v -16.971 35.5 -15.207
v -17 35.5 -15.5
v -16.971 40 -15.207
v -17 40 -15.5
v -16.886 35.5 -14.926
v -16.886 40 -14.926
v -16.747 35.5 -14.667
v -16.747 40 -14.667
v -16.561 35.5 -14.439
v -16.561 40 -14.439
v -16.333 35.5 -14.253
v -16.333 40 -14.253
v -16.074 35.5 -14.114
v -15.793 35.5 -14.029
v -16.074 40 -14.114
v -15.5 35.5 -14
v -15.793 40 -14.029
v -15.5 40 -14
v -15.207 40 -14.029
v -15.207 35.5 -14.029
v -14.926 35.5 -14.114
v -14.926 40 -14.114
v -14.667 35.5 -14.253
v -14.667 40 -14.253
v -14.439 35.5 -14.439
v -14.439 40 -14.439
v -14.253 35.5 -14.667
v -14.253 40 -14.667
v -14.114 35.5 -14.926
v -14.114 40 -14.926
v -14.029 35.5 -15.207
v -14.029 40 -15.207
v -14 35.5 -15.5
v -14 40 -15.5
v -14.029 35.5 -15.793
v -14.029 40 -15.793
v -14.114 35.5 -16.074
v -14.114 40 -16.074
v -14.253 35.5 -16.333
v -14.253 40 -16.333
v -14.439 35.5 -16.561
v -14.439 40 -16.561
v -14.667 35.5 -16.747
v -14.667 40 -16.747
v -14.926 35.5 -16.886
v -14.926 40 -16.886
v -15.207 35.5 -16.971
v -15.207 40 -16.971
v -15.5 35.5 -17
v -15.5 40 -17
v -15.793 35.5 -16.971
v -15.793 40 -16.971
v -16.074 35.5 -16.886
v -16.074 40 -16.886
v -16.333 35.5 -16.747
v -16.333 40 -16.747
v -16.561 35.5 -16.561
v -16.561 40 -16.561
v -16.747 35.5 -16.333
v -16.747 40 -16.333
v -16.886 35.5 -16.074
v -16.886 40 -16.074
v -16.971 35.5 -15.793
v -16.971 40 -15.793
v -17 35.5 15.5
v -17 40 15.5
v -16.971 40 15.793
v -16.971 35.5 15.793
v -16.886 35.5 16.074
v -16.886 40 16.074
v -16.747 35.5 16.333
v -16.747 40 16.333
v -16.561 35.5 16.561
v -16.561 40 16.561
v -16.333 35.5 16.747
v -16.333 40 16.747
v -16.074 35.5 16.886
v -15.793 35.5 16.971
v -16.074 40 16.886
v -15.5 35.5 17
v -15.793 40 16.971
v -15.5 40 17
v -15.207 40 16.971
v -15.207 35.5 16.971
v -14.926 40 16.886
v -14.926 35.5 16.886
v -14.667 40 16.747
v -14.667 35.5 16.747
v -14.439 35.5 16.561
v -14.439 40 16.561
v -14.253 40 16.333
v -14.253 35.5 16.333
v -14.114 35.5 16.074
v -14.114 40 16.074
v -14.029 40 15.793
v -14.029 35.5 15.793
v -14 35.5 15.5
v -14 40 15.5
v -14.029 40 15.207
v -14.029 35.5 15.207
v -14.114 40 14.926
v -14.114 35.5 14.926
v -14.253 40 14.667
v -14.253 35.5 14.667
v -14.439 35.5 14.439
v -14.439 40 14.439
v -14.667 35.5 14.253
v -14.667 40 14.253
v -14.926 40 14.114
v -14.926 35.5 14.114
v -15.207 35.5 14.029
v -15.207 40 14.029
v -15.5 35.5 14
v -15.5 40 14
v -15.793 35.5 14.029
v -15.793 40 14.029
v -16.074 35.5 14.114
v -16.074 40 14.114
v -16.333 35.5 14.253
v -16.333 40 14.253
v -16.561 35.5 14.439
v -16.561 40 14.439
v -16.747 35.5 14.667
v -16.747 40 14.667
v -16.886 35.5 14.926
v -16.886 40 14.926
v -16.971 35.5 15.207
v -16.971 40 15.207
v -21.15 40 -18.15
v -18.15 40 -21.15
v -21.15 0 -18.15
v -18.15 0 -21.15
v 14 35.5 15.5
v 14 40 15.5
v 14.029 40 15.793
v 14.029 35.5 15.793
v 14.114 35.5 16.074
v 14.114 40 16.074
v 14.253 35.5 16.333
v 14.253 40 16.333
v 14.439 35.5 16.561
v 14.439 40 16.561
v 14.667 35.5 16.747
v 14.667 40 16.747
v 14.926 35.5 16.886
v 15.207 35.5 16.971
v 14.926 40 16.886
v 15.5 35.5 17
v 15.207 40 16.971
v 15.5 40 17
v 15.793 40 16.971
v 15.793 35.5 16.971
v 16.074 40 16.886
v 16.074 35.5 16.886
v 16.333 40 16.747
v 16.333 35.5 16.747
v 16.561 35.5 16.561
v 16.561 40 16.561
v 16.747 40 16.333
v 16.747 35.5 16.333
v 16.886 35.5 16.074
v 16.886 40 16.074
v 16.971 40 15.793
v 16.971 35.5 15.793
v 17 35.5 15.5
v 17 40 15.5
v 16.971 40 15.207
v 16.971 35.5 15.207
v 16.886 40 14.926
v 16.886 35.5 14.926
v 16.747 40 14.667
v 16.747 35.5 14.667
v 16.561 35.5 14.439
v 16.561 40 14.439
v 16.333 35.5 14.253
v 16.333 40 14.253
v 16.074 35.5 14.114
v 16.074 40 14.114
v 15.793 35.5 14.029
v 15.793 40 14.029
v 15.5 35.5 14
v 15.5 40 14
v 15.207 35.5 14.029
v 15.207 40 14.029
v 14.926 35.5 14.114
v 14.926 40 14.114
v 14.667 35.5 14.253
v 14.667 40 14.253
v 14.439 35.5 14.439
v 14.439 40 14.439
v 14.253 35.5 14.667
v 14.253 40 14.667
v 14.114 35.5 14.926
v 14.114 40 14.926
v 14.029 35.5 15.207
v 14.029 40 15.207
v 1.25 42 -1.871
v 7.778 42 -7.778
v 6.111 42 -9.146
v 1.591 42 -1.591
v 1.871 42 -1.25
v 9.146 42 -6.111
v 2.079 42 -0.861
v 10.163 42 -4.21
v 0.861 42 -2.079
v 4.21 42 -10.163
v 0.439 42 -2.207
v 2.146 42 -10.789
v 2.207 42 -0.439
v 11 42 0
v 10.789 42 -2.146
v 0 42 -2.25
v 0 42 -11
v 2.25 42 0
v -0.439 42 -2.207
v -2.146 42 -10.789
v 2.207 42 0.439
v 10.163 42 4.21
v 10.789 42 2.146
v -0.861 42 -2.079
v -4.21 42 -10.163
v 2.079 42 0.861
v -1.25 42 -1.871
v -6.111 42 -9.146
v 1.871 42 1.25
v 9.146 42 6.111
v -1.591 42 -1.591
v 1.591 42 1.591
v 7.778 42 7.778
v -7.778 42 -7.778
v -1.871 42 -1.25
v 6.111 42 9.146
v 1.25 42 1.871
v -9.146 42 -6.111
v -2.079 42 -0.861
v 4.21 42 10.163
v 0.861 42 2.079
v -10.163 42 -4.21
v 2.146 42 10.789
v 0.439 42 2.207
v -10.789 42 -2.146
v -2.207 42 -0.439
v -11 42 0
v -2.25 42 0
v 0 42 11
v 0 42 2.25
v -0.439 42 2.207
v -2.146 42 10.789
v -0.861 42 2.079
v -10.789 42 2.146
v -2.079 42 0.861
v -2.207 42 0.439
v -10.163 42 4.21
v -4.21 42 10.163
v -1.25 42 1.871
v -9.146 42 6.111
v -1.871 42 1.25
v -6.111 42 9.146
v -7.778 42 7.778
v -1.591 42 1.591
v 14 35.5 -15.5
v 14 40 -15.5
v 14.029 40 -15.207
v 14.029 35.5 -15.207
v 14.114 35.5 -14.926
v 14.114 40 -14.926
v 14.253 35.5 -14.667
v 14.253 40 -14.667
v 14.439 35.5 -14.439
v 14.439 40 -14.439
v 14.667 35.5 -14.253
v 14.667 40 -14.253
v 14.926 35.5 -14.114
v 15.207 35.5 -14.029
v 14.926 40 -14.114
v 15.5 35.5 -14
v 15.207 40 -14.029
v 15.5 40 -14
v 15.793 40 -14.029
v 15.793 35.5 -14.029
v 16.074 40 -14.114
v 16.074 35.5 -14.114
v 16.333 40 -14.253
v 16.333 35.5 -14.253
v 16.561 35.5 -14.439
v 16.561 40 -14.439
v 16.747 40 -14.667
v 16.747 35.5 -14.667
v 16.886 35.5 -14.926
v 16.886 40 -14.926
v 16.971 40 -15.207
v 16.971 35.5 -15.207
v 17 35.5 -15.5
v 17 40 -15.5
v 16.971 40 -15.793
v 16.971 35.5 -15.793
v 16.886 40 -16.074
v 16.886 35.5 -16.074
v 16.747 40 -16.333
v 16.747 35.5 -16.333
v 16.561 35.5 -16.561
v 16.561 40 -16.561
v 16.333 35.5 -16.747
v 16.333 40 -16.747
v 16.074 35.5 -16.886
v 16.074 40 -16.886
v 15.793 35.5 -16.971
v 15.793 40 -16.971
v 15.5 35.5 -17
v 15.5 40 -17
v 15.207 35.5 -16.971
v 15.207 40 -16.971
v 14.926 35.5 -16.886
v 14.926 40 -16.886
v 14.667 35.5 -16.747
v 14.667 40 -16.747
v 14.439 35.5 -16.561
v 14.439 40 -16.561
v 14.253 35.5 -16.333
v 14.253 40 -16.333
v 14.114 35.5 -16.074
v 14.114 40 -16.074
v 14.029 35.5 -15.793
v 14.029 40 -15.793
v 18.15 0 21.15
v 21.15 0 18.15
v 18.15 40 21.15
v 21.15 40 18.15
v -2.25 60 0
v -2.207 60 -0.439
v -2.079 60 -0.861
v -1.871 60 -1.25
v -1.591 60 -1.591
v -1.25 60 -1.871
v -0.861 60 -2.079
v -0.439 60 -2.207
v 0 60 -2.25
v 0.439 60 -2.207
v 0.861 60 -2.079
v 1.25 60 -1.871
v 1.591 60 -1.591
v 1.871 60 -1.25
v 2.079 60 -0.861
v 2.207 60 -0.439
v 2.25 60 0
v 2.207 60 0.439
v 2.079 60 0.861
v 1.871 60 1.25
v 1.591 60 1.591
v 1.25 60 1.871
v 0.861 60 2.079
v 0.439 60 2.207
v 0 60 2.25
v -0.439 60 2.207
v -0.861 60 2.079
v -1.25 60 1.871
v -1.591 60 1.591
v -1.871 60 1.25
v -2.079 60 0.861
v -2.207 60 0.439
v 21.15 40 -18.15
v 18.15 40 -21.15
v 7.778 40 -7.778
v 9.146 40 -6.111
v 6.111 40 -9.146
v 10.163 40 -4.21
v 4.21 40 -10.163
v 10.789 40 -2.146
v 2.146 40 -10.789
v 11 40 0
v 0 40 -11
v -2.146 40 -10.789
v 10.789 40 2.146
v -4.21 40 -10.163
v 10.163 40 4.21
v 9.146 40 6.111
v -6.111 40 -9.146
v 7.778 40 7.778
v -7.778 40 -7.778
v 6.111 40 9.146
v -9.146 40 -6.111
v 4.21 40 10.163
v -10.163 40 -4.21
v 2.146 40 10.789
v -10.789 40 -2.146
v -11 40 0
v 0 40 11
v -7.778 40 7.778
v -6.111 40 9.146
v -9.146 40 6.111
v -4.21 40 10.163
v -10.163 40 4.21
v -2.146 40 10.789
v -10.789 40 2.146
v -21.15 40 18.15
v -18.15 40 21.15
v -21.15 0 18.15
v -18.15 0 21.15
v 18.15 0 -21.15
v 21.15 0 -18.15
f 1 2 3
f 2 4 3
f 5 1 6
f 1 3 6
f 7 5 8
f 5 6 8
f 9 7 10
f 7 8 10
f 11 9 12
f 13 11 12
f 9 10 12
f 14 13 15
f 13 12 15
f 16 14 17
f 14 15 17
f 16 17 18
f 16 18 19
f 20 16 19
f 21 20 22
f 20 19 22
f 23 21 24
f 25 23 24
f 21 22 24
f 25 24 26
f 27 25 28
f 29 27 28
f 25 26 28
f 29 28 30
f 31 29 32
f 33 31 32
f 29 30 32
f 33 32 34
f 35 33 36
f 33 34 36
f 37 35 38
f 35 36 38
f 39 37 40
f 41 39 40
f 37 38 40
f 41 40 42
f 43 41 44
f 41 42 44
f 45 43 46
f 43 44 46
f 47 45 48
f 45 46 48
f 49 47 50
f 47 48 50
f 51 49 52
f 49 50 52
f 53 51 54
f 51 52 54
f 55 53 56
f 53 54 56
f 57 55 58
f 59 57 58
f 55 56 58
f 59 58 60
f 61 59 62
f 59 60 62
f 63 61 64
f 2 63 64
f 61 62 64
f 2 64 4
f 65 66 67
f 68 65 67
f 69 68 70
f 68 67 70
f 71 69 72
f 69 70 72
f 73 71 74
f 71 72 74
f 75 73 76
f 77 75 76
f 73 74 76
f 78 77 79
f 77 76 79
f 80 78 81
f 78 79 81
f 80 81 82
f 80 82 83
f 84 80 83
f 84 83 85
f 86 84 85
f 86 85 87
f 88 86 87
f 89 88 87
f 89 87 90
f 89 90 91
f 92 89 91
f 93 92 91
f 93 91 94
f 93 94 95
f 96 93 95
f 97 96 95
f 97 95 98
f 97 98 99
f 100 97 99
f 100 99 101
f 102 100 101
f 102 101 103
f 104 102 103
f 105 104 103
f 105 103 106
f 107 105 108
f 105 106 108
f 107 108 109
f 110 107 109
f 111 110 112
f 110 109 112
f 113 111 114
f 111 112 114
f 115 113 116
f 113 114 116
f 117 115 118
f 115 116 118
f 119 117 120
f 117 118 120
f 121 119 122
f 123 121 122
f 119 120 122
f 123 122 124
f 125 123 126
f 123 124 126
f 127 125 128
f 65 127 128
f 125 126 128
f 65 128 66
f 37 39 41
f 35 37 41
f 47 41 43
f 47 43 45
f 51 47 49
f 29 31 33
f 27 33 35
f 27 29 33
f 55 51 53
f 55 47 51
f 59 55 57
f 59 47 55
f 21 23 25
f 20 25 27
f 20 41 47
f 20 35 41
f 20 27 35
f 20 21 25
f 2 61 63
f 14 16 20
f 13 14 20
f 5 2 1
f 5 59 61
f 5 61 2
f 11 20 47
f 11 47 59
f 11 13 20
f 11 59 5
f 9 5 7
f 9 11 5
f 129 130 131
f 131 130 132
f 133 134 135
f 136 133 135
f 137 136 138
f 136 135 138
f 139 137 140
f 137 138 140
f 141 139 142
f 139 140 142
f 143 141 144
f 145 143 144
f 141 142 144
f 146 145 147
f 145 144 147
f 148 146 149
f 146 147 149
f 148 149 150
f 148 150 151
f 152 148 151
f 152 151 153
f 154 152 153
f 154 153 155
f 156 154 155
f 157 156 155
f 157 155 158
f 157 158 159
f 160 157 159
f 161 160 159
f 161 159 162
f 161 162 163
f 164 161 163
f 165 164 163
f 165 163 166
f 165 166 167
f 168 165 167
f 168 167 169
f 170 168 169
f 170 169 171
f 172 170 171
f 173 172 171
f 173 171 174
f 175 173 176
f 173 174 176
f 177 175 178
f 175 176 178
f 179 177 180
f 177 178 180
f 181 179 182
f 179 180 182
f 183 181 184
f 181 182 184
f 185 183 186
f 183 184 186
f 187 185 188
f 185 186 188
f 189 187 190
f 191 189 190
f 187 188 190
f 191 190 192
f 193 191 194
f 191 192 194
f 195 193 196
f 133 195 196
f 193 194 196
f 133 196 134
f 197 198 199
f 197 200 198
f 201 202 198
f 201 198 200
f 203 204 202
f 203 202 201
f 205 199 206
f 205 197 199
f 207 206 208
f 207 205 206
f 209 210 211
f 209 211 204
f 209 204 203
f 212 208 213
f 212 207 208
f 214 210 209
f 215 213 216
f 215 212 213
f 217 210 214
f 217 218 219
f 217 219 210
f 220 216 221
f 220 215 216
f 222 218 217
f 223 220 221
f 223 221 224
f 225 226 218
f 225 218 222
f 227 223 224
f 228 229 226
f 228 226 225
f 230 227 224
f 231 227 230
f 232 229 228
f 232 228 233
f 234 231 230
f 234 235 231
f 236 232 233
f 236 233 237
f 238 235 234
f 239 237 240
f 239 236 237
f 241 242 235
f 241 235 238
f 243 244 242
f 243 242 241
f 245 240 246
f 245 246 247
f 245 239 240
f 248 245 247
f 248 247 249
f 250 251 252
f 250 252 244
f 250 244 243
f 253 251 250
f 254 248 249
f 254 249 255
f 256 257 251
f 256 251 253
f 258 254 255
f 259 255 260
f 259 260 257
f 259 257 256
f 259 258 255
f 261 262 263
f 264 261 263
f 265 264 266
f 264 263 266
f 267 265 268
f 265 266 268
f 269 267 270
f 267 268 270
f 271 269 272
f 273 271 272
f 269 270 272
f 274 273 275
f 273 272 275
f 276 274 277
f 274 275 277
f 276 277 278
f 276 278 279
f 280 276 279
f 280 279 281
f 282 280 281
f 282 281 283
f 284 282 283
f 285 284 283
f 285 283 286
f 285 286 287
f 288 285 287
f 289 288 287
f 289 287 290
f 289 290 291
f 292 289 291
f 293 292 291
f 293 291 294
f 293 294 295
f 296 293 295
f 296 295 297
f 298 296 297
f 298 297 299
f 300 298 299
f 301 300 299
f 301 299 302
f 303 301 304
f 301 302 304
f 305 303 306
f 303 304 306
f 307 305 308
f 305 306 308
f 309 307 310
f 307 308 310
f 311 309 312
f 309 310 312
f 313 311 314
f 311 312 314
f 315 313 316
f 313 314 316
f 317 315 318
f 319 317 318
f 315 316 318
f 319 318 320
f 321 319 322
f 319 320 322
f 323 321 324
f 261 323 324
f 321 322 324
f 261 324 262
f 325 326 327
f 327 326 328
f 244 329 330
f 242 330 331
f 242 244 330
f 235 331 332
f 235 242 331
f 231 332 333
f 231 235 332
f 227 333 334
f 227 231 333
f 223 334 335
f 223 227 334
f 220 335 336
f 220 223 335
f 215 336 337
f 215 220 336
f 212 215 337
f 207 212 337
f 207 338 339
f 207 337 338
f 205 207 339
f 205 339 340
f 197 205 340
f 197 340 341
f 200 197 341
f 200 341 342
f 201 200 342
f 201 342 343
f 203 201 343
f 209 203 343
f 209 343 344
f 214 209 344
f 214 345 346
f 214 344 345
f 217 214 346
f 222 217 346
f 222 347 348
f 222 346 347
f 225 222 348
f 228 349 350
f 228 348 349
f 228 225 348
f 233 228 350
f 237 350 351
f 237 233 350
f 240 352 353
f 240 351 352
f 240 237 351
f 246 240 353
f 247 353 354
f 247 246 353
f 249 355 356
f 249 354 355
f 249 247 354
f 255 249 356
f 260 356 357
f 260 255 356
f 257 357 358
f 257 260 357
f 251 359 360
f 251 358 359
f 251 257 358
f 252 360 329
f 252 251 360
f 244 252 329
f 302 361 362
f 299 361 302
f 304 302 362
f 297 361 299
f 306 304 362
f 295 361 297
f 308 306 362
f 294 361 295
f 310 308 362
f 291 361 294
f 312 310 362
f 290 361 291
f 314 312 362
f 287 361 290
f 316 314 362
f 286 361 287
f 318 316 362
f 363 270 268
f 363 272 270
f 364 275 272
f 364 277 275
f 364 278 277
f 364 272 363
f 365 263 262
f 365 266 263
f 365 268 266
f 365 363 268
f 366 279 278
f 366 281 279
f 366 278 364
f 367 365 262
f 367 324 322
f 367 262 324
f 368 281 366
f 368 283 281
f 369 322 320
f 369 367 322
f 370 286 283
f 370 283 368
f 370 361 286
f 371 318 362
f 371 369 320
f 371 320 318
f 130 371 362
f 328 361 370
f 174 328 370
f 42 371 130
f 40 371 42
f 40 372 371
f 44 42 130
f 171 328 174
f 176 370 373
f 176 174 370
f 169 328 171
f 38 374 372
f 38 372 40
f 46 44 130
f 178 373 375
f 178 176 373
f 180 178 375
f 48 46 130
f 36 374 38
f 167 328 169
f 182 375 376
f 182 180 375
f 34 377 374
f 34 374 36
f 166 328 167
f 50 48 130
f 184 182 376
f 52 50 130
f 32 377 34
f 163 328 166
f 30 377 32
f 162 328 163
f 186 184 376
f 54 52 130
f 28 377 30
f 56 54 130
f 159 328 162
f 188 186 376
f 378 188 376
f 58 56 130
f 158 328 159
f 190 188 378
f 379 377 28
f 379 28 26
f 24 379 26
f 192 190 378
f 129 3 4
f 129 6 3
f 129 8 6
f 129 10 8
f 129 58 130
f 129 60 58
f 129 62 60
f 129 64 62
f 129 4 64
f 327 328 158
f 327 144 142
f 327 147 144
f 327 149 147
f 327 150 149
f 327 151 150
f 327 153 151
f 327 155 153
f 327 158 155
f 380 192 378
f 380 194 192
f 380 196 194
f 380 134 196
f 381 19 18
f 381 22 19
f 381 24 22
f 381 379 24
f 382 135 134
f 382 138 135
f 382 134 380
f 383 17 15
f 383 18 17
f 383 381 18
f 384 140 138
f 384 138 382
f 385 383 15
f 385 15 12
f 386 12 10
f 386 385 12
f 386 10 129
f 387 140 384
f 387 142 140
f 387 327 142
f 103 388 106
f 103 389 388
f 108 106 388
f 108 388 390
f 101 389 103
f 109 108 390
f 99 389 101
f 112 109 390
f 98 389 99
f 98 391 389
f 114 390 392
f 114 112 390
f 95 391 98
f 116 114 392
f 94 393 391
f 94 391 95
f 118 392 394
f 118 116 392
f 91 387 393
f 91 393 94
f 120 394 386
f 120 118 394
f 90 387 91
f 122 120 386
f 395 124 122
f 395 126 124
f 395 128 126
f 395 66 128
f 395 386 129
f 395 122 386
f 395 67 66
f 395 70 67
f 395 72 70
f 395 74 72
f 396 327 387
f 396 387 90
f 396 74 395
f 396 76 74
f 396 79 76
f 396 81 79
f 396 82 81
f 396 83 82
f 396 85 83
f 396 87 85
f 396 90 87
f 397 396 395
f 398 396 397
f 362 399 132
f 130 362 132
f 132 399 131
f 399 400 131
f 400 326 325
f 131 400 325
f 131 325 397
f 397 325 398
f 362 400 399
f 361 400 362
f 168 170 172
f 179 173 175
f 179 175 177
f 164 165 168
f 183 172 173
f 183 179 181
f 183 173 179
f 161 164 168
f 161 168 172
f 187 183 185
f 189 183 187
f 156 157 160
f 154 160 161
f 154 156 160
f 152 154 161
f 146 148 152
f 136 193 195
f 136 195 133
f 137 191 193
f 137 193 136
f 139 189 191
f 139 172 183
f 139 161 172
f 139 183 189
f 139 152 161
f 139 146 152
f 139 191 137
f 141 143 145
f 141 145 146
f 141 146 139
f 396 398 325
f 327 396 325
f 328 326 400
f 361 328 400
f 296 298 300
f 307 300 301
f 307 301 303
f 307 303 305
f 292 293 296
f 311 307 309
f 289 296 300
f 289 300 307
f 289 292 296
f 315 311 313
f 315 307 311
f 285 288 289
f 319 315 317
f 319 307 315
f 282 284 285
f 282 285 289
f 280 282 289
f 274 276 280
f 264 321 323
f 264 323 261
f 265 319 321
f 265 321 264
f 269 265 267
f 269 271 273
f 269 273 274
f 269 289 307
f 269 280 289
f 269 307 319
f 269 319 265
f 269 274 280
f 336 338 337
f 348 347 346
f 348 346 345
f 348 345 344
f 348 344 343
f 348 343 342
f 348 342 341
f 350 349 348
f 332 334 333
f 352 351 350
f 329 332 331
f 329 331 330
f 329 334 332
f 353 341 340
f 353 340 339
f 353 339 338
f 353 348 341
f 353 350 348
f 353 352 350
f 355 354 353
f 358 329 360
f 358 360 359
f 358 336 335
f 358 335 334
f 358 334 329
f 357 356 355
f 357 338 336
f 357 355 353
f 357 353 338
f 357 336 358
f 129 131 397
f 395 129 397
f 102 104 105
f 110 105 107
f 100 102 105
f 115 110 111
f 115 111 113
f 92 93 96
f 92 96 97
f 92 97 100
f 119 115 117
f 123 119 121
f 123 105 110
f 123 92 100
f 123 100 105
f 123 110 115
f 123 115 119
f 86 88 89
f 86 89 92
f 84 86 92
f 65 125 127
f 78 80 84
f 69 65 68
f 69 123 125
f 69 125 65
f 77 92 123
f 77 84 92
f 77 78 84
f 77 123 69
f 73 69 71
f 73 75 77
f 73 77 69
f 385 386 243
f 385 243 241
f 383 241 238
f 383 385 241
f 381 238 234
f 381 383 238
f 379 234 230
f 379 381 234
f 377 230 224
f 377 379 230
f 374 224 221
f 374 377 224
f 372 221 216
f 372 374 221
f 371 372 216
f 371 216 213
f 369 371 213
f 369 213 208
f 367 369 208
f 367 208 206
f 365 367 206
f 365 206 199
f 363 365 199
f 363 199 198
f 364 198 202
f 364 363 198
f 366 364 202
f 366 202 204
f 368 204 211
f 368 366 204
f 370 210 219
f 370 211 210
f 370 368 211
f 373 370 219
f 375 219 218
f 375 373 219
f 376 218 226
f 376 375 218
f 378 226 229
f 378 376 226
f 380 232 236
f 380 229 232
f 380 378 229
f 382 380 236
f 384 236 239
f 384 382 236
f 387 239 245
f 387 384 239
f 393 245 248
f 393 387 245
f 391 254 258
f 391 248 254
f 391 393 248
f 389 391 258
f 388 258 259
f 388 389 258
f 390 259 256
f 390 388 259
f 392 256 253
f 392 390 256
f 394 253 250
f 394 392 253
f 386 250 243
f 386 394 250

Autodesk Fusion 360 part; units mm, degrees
sketch "スケッチ1" plane through (0, 0, 0) normal (0, 1, 0) x (1, 0, 0)
  line L0 (0, 0) -> (21.15, 0)
  line L1 (21.15, 0) -> (21.15, 21.15)
  line L2 (21.15, 21.15) -> (0, 21.15)
  line L3 (0, 21.15) -> (0, 0)
  line L4 (0, 0) -> (15.5, 0) construction
  line L5 (15.5, 0) -> (15.5, 15.5) construction
  line L6 (15.5, 15.5) -> (0, 15.5) construction
  line L7 (0, 15.5) -> (0, 0) construction
  circle A0 centre (15.5, 15.5) radius 1.5
  dimension "d1" = 21.15
  dimension "d2" = 21.15
  dimension "d3" = 15.5
  dimension "d4" = 15.5
  dimension "d5" = 3
extrude "押し出し1" add sketch "スケッチ1" along normal blind 40 contours L0 L1 L2 L3 | A0 makes body 1
mirror "ミラー1" about plane through (0, 0, 0) normal (0, 0, 1) of bodies 1 makes body 2
mirror "ミラー2" about plane through (0, 0, 21.15) normal (-1, 0, 0) of bodies 1 2 makes body 3 at (0, 13.3333, -14.1) makes body 4 at (0, 13.3333, 14.1)
combine "結合1" operation add target body 4 tool bodies 1 2 3
sketch "スケッチ2" plane through (0, 40, 0) normal (0, 1, 0) x (-1, 0, 0)
  line L0 (-21.15, -21.15) -> (21.15, -21.15)
  line L1 (21.15, -21.15) -> (21.15, 21.15)
  line L2 (21.15, 21.15) -> (-21.15, 21.15)
  line L3 (-21.15, 21.15) -> (-21.15, -21.15)
  circle A0 centre (0, 0) radius 11
  line L4 (15.5, 15.5) -> (-15.5, 15.5) construction
  line L5 (-15.5, 15.5) -> (-15.5, -15.5) construction
  line L6 (-15.5, -15.5) -> (15.5, -15.5) construction
  line L7 (15.5, -15.5) -> (15.5, 15.5) construction
  line L8 (15.5, 15.5) -> (-15.5, -15.5) construction
  line L9 (-15.5, 15.5) -> (15.5, -15.5) construction
  circle A1 centre (15.5, -15.5) radius 1.5
  circle A2 centre (-15.5, -15.5) radius 1.5
  circle A3 centre (15.5, 15.5) radius 1.5
  circle A4 centre (-15.5, 15.5) radius 1.5
  circle A5 centre (0, 0) radius 2.25
  dimension "d10" = 22
  dimension "d13" = 31
  dimension "d14" = 31
  dimension "d15" = 3
  dimension "d16" = 3
  dimension "d17" = 3
  dimension "d18" = 3
  dimension "d21" = 4.5
extrude "押し出し2" add sketch "スケッチ2" along normal blind 2 contours A0 | A5 bodies 4
extrude "押し出し3" cut sketch "スケッチ2" against normal blind 4.5 contours A1 | A2 | A3 | A4 bodies 4
extrude "押し出し4" add sketch "スケッチ2" along normal blind 20 contours A5 bodies 4
chamfer "面取り1" distance 3 angle 45 4 edges at (-21.15, 20, -21.15) (-21.15, 20, 21.15) (21.15, 20, 21.15) (21.15, 20, -21.15) on bodies 4
equation "d1 = ( 42.3 / 2 ) * 1 mm"
equation "d2 = ( 42.3 / 2 ) * 1 mm"
equation "d3 = ( 31 / 2 ) * 1 mm"
equation "d4 = ( 31 / 2 ) * 1 mm"
